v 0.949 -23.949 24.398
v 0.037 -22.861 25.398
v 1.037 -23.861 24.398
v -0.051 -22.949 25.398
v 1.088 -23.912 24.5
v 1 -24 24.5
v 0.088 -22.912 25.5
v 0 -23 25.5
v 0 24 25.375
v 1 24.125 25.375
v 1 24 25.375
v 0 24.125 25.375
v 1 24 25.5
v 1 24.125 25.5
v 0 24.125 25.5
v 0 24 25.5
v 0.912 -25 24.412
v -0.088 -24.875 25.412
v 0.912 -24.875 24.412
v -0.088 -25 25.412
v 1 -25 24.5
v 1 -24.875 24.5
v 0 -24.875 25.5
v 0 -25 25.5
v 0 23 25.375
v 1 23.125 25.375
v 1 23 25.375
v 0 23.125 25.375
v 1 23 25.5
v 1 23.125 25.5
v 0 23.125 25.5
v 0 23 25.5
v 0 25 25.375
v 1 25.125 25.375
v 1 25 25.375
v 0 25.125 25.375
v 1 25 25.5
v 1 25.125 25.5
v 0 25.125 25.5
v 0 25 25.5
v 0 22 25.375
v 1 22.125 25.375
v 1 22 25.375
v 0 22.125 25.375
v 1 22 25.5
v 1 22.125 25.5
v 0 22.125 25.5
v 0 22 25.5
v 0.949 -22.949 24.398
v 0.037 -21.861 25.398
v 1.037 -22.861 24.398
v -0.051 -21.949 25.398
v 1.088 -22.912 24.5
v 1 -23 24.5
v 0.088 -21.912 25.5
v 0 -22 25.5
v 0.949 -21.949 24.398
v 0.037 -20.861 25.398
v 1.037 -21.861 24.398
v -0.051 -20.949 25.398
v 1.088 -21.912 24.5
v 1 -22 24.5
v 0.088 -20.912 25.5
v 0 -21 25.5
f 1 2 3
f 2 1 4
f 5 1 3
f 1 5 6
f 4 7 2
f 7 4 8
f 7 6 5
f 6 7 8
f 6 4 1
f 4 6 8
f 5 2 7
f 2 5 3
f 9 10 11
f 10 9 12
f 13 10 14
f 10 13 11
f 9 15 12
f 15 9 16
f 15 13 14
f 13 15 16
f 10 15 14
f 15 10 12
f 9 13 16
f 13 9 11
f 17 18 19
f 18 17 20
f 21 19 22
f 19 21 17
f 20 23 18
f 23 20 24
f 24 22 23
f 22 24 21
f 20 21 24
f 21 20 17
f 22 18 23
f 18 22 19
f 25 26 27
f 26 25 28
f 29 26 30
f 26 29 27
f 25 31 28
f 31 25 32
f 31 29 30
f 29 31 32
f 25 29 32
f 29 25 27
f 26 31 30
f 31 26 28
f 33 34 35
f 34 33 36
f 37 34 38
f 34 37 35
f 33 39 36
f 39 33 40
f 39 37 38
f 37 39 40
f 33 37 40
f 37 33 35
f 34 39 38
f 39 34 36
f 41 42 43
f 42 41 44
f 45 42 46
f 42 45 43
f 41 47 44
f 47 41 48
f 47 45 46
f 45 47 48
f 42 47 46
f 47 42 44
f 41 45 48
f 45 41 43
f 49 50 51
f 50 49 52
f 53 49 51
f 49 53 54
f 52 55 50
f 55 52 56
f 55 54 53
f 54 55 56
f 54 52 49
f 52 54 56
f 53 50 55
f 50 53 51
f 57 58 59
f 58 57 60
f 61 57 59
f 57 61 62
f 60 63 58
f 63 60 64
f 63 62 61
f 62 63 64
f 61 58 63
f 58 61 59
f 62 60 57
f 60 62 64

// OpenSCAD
translate(v = [-0.5, -0.5, 0]) {
	/*Shell 0*/
	union() {
		%/*Nodes shell 0*/
		union() {
			/*$_38*/
			color(alpha = 0.1, c = "yellow") {
				translate(v = [0, -23.0, 25.0]) {
					cube(size = [1, 1, 1]);
				}
			}
			/*$_16*/
			color(alpha = 0.1, c = "orange") {
				translate(v = [0, 24.0, 25.0]) {
					cube(size = [1, 1, 1]);
				}
			}
			/*$_50*/
			color(alpha = 0.1, c = "yellow") {
				translate(v = [0, -25.0, 25.0]) {
					cube(size = [1, 1, 1]);
				}
			}
			/*$_28*/
			color(alpha = 0.1, c = "orange") {
				translate(v = [0, 23.0, 25.0]) {
					cube(size = [1, 1, 1]);
				}
			}
			/*$_8*/
			color(alpha = 0.1, c = "pink") {
				translate(v = [0, 25.0, 25.0]) {
					cube(size = [1, 1, 1]);
				}
			}
			/*$_11*/
			color(alpha = 0.1, c = "pink") {
				translate(v = [0, 22.0, 25.0]) {
					cube(size = [1, 1, 1]);
				}
			}
			/*$_12*/
			color(alpha = 0.1, c = "pink") {
				translate(v = [0, -22.0, 25.0]) {
					cube(size = [1, 1, 1]);
				}
			}
			/*$_15*/
			color(alpha = 0.1, c = "pink") {
				translate(v = [0, -21.0, 25.0]) {
					cube(size = [1, 1, 1]);
				}
			}
		}
		/*Edges shell 0*/
		union() {
			/*one.ctrl_a[0].flush - $_38*/
			translate(v = [0.5, -22.5, 25.5]) {
				rotate(a = [0, 125.26438968275465, -45.0]) {
					cube(size = [0.125, 0.125, 1.7320508075688772]);
				}
			}
			/*one.ctrl_a[0].hole - $_16*/
			translate(v = [0.5, 24.5, 25.5]) {
				rotate(a = [0, 90.0, 0.0]) {
					cube(size = [0.125, 0.125, 1.0]);
				}
			}
			/*one.ctrl_a[12].flush - $_50*/
			translate(v = [0.5, -24.5, 25.5]) {
				rotate(a = [0, 135.0, 0.0]) {
					cube(size = [0.125, 0.125, 1.4142135623730951]);
				}
			}
			/*one.ctrl_a[12].hole - $_28*/
			translate(v = [0.5, 23.5, 25.5]) {
				rotate(a = [0, 90.0, 0.0]) {
					cube(size = [0.125, 0.125, 1.0]);
				}
			}
			/*one.pinholes[0].out[0].hole - $_8*/
			translate(v = [0.5, 25.5, 25.5]) {
				rotate(a = [0, 90.0, 0.0]) {
					cube(size = [0.125, 0.125, 1.0]);
				}
			}
			/*one.pinholes[0].out[3].hole - $_11*/
			translate(v = [0.5, 22.5, 25.5]) {
				rotate(a = [0, 90.0, 0.0]) {
					cube(size = [0.125, 0.125, 1.0]);
				}
			}
			/*one.pinholes[1].out[0].hole - $_12*/
			translate(v = [0.5, -21.5, 25.5]) {
				rotate(a = [0, 125.26438968275465, -45.0]) {
					cube(size = [0.125, 0.125, 1.7320508075688772]);
				}
			}
			/*one.pinholes[1].out[3].hole - $_15*/
			translate(v = [0.5, -20.5, 25.5]) {
				rotate(a = [0, 125.26438968275465, -45.0]) {
					cube(size = [0.125, 0.125, 1.7320508075688772]);
				}
			}
		}
	}
	/*Shell 1*/
	union() {
		%/*Nodes shell 1*/
		union() {
			/*one.ctrl_a[0].flush*/
			color(alpha = 0.1, c = "black") {
				translate(v = [1, -24.0, 24.0]) {
					cube(size = [1, 1, 1]);
				}
			}
			/*one.ctrl_a[0].hole*/
			color(alpha = 0.1, c = "black") {
				translate(v = [1, 24.0, 25.0]) {
					cube(size = [1, 1, 1]);
				}
			}
			/*one.ctrl_a[12].flush*/
			color(alpha = 0.1, c = "black") {
				translate(v = [1, -25.0, 24.0]) {
					cube(size = [1, 1, 1]);
				}
			}
			/*one.ctrl_a[12].hole*/
			color(alpha = 0.1, c = "black") {
				translate(v = [1, 23.0, 25.0]) {
					cube(size = [1, 1, 1]);
				}
			}
			/*one.pinholes[0].out[0].hole*/
			color(alpha = 0.1, c = "black") {
				translate(v = [1, 25.0, 25.0]) {
					cube(size = [1, 1, 1]);
				}
			}
			/*one.pinholes[0].out[3].hole*/
			color(alpha = 0.1, c = "black") {
				translate(v = [1, 22.0, 25.0]) {
					cube(size = [1, 1, 1]);
				}
			}
			/*one.pinholes[1].out[0].hole*/
			color(alpha = 0.1, c = "black") {
				translate(v = [1, -23.0, 24.0]) {
					cube(size = [1, 1, 1]);
				}
			}
			/*one.pinholes[1].out[3].hole*/
			color(alpha = 0.1, c = "black") {
				translate(v = [1, -22.0, 24.0]) {
					cube(size = [1, 1, 1]);
				}
			}
		}
		/*Edges shell 1*/
		union();
	}
	/*Shell 2*/
	union() {
		%/*Nodes shell 2*/
		union();
		/*Edges shell 2*/
		union();
	}
	/*Shell 3*/
	union() {
		%/*Nodes shell 3*/
		union();
		/*Edges shell 3*/
		union();
	}
	/*Shell 4*/
	union() {
		%/*Nodes shell 4*/
		union();
		/*Edges shell 4*/
		union();
	}
	/*Shell 5*/
	union() {
		%/*Nodes shell 5*/
		union();
		/*Edges shell 5*/
		union();
	}
	/*Shell 6*/
	union() {
		%/*Nodes shell 6*/
		union();
		/*Edges shell 6*/
		union();
	}
	/*Shell 7*/
	union() {
		%/*Nodes shell 7*/
		union();
		/*Edges shell 7*/
		union();
	}
	/*Shell 8*/
	union() {
		%/*Nodes shell 8*/
		union();
		/*Edges shell 8*/
		union();
	}
	/*Shell 9*/
	union() {
		%/*Nodes shell 9*/
		union();
		/*Edges shell 9*/
		union();
	}
	/*Shell 10*/
	union() {
		%/*Nodes shell 10*/
		union();
		/*Edges shell 10*/
		union();
	}
	/*Shell 11*/
	union() {
		%/*Nodes shell 11*/
		union();
		/*Edges shell 11*/
		union();
	}
	/*Shell 12*/
	union() {
		%/*Nodes shell 12*/
		union();
		/*Edges shell 12*/
		union();
	}
	/*Shell 13*/
	union() {
		%/*Nodes shell 13*/
		union();
		/*Edges shell 13*/
		union();
	}
	/*Shell 14*/
	union() {
		%/*Nodes shell 14*/
		union();
		/*Edges shell 14*/
		union();
	}
	/*Shell 15*/
	union() {
		%/*Nodes shell 15*/
		union();
		/*Edges shell 15*/
		union();
	}
	/*Shell 16*/
	union() {
		%/*Nodes shell 16*/
		union();
		/*Edges shell 16*/
		union();
	}
	/*Shell 17*/
	union() {
		%/*Nodes shell 17*/
		union();
		/*Edges shell 17*/
		union();
	}
	/*Shell 18*/
	union() {
		%/*Nodes shell 18*/
		union();
		/*Edges shell 18*/
		union();
	}
	/*Shell 19*/
	union() {
		%/*Nodes shell 19*/
		union();
		/*Edges shell 19*/
		union();
	}
	/*Shell 20*/
	union() {
		%/*Nodes shell 20*/
		union();
		/*Edges shell 20*/
		union();
	}
	/*Shell 21*/
	union() {
		%/*Nodes shell 21*/
		union();
		/*Edges shell 21*/
		union();
	}
	/*Shell 22*/
	union() {
		%/*Nodes shell 22*/
		union();
		/*Edges shell 22*/
		union();
	}
	/*Shell 23*/
	union() {
		%/*Nodes shell 23*/
		union();
		/*Edges shell 23*/
		union();
	}
	/*Shell 24*/
	union() {
		%/*Nodes shell 24*/
		union();
		/*Edges shell 24*/
		union();
	}
	/*Shell 25*/
	union() {
		%/*Nodes shell 25*/
		union();
		/*Edges shell 25*/
		union();
	}
	/*Shell 26*/
	union() {
		%/*Nodes shell 26*/
		union();
		/*Edges shell 26*/
		union();
	}
	/*Shell 27*/
	union() {
		%/*Nodes shell 27*/
		union();
		/*Edges shell 27*/
		union();
	}
	/*Shell 28*/
	union() {
		%/*Nodes shell 28*/
		union();
		/*Edges shell 28*/
		union();
	}
	/*Shell 29*/
	union() {
		%/*Nodes shell 29*/
		union();
		/*Edges shell 29*/
		union();
	}
	/*Shell 30*/
	union() {
		%/*Nodes shell 30*/
		union();
		/*Edges shell 30*/
		union();
	}
	/*Shell 31*/
	union() {
		%/*Nodes shell 31*/
		union();
		/*Edges shell 31*/
		union();
	}
	/*Shell 32*/
	union() {
		%/*Nodes shell 32*/
		union();
		/*Edges shell 32*/
		union();
	}
}
